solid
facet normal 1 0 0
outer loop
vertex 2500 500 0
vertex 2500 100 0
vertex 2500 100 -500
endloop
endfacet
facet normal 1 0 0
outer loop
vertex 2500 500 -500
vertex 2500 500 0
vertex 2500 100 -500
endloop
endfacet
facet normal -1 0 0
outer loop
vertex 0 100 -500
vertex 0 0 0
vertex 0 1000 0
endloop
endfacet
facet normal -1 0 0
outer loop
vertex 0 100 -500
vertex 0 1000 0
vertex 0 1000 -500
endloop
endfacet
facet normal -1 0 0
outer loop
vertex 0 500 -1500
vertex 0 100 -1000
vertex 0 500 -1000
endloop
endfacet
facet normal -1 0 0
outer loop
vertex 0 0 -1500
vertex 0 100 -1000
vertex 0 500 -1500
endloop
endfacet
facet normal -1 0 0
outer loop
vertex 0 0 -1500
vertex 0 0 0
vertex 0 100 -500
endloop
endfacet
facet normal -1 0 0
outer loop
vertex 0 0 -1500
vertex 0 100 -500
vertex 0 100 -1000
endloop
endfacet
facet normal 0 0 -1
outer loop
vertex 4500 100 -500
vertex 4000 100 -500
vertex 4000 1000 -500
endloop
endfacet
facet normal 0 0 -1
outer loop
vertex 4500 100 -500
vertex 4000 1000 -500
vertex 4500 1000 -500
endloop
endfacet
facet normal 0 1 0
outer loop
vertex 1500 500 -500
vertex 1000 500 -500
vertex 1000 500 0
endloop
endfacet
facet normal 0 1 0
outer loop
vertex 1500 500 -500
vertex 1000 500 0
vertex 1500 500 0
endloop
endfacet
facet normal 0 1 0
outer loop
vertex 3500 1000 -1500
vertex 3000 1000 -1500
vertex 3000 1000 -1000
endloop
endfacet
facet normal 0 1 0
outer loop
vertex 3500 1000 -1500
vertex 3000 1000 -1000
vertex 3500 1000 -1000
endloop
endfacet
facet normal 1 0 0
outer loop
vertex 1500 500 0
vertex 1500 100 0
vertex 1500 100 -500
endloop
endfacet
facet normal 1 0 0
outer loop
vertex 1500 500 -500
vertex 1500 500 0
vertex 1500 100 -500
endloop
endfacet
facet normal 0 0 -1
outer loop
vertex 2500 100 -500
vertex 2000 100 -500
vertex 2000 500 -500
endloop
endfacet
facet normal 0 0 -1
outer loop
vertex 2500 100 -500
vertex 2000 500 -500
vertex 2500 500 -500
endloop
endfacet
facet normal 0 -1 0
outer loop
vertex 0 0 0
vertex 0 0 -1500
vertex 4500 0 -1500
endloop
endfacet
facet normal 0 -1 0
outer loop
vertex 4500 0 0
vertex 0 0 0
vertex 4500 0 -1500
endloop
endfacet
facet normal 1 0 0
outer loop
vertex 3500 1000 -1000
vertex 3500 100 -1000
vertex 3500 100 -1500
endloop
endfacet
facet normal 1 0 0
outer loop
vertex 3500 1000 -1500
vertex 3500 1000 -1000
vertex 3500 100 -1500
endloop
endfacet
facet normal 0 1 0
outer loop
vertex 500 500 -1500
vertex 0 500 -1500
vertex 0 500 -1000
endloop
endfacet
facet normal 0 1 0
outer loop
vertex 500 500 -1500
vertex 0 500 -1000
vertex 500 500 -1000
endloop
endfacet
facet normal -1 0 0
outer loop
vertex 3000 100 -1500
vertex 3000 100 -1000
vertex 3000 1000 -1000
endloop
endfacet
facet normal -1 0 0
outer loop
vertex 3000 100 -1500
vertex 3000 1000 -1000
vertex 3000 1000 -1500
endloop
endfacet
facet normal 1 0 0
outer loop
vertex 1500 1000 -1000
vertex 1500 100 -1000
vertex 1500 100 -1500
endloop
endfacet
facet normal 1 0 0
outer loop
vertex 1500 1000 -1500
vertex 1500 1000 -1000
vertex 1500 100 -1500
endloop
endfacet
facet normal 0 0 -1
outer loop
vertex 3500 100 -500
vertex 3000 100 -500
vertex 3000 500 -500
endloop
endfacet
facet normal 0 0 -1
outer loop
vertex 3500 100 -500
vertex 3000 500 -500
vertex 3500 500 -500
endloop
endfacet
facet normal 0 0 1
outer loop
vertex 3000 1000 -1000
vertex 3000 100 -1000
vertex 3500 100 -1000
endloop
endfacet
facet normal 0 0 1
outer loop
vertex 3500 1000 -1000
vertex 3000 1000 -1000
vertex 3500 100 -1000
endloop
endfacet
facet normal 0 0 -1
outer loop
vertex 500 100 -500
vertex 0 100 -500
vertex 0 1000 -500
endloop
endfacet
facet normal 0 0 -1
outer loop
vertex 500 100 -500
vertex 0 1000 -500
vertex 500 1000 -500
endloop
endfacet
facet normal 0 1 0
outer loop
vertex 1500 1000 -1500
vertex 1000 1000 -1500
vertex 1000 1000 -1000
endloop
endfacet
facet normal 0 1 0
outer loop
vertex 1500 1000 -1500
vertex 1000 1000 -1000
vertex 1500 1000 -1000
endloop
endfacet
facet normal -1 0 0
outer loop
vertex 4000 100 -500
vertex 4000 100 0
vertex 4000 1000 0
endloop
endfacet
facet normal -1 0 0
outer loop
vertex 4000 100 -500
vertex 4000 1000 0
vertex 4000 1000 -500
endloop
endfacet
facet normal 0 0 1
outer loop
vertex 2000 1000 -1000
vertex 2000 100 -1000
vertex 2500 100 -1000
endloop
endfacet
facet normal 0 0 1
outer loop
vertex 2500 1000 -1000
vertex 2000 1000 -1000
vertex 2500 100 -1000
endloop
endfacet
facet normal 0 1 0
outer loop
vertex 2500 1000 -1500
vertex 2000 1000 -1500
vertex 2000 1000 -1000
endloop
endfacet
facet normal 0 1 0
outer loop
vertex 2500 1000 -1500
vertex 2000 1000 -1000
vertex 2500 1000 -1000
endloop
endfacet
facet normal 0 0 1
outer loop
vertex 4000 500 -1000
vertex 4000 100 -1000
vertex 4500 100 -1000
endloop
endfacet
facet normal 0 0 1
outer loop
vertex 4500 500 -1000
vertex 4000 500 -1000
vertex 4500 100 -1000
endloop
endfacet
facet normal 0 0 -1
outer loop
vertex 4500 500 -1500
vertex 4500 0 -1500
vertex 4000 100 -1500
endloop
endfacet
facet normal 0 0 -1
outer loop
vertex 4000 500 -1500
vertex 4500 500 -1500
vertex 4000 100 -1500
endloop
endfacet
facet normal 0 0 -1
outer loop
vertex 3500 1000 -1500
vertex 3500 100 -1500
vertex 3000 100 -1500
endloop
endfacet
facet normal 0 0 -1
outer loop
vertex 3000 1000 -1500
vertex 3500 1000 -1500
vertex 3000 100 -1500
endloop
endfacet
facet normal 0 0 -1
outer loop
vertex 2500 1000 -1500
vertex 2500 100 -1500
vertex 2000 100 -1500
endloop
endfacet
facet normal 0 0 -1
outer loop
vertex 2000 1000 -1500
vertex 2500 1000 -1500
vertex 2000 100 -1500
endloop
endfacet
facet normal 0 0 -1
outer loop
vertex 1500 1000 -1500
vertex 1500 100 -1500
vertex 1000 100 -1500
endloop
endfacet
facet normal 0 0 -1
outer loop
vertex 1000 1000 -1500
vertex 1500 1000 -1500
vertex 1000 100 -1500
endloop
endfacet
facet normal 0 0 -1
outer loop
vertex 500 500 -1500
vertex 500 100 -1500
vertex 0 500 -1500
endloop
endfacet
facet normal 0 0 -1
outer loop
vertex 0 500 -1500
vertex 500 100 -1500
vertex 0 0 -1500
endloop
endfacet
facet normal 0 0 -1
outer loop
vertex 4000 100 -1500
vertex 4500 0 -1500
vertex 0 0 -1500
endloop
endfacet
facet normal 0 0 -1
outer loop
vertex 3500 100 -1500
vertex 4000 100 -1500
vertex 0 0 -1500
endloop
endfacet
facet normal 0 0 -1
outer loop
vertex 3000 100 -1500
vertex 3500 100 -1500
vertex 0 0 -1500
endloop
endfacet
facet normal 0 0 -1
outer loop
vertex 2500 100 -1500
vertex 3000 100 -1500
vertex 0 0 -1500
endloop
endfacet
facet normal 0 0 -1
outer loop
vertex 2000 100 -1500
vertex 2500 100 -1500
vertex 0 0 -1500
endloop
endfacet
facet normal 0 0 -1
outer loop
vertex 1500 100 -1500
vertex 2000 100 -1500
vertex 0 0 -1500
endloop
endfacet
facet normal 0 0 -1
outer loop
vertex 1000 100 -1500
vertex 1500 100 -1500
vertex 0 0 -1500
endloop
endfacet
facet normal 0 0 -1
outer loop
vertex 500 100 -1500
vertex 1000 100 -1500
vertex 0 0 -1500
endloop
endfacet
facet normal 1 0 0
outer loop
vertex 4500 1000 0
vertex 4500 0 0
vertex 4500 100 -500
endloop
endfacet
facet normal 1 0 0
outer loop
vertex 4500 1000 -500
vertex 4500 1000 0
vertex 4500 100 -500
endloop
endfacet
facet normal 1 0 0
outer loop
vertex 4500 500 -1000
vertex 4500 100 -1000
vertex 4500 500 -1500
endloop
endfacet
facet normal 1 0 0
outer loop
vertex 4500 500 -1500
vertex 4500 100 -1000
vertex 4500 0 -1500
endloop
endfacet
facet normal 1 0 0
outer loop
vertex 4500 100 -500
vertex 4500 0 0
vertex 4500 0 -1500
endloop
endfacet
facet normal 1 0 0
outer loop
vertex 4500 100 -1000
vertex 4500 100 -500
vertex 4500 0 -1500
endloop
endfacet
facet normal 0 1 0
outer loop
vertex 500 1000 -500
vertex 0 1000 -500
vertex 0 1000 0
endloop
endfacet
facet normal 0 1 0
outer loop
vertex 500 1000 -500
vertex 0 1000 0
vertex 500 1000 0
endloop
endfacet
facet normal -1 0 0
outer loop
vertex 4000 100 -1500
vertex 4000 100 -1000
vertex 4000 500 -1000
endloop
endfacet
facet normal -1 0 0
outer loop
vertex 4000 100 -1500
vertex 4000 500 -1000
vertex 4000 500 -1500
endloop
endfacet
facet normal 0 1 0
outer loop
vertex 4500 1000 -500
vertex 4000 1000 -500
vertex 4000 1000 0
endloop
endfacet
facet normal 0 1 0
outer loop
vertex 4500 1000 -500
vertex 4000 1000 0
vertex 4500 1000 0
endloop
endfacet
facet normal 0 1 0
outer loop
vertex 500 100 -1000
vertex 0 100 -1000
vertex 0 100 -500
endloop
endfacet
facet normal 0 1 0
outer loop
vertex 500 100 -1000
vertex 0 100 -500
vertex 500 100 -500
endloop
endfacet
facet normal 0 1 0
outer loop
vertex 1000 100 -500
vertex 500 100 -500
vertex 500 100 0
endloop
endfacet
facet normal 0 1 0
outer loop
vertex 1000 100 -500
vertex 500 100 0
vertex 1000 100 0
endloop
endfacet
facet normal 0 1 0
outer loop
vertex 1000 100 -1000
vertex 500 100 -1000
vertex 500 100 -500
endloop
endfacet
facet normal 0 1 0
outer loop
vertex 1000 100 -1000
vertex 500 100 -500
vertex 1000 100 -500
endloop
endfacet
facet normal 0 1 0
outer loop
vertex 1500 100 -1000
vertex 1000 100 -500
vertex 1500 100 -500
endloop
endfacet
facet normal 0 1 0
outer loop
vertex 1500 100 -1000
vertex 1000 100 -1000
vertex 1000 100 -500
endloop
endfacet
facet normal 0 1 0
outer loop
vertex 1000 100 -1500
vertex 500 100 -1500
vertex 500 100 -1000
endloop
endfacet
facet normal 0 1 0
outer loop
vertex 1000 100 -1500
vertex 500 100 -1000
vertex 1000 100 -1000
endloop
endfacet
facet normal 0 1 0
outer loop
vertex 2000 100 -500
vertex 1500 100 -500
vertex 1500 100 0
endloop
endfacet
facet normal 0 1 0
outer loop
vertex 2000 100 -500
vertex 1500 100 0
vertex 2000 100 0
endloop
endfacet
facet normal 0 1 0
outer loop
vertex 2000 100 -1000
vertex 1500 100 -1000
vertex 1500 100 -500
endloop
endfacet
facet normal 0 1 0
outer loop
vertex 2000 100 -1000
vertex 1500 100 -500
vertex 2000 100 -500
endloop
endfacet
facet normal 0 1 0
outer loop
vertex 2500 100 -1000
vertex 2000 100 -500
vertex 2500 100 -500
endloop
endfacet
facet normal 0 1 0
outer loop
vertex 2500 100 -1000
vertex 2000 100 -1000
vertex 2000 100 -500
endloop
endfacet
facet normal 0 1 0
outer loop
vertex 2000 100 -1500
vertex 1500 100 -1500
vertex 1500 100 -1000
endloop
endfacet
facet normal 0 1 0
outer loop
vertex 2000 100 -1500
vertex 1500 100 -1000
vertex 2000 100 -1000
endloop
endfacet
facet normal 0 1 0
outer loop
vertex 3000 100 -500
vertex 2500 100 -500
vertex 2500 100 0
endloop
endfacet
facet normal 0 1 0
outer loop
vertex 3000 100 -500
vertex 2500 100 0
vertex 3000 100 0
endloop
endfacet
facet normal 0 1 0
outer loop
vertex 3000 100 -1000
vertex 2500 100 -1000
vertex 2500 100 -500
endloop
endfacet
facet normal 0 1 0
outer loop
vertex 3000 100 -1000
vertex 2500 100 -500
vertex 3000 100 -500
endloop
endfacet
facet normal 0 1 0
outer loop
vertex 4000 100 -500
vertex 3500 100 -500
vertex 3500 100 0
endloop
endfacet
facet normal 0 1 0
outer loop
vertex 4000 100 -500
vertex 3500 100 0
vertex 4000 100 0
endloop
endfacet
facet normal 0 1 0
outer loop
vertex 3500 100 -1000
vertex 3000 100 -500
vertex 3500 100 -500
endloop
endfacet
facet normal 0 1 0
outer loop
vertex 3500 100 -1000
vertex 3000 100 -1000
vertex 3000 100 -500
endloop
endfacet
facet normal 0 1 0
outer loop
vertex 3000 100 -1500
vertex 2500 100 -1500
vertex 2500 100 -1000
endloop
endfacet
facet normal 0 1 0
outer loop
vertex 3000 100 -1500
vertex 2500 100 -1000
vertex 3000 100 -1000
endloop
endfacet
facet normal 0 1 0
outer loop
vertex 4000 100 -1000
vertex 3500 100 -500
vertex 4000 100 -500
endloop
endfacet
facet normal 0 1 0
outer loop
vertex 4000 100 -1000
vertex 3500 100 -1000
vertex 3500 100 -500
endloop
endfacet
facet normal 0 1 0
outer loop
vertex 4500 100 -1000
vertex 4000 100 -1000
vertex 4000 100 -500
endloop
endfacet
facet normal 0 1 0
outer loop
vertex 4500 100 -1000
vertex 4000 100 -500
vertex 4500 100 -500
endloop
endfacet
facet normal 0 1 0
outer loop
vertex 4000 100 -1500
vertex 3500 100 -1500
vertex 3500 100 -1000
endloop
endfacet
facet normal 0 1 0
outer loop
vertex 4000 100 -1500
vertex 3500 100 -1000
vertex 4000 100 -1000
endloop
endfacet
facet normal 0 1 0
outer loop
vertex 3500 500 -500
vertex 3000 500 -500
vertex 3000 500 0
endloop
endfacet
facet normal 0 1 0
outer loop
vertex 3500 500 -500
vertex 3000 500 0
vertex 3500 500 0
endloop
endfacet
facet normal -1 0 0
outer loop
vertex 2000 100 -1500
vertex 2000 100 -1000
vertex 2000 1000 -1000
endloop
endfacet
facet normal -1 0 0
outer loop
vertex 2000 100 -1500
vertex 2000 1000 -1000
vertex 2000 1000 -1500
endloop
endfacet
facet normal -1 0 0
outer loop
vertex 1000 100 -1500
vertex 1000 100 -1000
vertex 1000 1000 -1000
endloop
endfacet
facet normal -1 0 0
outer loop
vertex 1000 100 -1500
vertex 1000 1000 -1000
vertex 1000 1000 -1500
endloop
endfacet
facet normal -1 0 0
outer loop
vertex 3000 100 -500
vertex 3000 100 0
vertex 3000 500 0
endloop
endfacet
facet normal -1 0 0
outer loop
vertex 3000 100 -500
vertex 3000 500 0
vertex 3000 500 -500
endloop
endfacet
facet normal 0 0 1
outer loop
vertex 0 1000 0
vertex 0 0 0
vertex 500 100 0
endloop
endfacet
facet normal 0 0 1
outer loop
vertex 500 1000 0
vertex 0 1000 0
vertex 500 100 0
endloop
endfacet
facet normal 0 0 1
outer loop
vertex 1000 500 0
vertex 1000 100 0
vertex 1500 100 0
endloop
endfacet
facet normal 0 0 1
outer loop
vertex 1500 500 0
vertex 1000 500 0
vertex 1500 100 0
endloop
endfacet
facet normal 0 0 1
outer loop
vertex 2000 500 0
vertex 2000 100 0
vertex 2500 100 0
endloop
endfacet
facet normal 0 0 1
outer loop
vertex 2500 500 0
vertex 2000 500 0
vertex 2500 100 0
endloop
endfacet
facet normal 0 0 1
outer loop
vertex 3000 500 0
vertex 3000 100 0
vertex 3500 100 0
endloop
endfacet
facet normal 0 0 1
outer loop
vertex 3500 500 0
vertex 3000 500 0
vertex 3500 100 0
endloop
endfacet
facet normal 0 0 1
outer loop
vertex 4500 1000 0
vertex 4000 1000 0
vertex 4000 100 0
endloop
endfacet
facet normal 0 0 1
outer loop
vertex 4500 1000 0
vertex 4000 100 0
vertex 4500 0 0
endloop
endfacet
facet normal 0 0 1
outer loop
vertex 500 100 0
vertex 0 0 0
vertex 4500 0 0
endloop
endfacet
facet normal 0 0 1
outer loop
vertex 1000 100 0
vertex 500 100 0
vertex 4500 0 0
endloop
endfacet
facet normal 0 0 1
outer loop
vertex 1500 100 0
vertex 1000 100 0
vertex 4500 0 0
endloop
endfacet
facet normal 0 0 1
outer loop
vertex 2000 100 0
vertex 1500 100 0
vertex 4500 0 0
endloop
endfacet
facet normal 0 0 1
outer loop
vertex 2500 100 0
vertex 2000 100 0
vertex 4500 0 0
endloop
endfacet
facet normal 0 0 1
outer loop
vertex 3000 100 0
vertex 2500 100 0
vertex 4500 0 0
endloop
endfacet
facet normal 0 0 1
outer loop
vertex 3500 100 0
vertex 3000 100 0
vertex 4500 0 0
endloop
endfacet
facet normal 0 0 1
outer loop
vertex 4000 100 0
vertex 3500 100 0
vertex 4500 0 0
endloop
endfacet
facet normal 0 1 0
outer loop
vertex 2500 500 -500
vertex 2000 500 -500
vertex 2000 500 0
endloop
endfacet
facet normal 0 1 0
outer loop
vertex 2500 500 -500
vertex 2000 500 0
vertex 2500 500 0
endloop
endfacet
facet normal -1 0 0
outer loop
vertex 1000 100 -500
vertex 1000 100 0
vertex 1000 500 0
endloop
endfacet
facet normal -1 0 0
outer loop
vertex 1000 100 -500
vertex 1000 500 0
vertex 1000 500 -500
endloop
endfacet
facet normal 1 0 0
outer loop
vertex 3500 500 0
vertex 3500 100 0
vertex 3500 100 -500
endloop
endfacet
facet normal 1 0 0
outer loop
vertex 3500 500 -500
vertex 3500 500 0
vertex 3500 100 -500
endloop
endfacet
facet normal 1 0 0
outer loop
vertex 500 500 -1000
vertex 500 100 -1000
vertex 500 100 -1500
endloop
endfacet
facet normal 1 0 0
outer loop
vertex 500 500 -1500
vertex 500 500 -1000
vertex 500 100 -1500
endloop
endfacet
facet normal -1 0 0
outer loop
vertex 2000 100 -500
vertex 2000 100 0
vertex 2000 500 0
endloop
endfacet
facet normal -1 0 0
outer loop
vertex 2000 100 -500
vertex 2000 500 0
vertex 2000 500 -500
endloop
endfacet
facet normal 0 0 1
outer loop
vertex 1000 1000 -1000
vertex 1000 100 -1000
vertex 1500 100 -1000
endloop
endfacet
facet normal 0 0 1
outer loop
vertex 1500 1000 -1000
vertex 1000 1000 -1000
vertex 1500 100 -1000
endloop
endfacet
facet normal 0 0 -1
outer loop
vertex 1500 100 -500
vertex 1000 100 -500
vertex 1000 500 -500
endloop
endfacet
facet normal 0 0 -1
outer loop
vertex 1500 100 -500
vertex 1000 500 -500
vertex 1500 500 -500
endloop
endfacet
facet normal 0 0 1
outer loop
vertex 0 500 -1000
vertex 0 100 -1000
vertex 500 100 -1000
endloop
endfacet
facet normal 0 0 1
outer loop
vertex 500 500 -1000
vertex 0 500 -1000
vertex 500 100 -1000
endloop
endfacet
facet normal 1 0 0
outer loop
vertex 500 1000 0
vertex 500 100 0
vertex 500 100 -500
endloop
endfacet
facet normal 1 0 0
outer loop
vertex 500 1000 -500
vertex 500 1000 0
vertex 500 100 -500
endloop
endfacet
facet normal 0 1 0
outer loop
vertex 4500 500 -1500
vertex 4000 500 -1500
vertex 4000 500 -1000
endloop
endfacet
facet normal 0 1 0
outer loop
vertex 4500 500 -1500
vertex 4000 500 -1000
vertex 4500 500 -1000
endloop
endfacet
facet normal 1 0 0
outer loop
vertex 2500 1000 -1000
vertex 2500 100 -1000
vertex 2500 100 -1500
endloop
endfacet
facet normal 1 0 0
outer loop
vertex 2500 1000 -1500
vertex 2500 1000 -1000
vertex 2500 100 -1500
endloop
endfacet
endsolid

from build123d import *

# Parameters (mm, degrees)
SKETCH2_W             = 500
SKETCH2_H             = 500
BOSS_EXTRUDE1_DEPTH   = 500
BOSS_EXTRUDE1_2_DEPTH = 500
BOSS_EXTRUDE1_3_DEPTH = 500
BOSS_EXTRUDE1_4_DEPTH = 500
BOSS_EXTRUDE1_5_DEPTH = 500
SKETCH2_3_W           = 500
SKETCH2_3_H           = 500
BOSS_EXTRUDE2_DEPTH   = 1000
BOSS_EXTRUDE2_2_DEPTH = 1000
BOSS_EXTRUDE2_3_DEPTH = 1000
BOSS_EXTRUDE2_4_DEPTH = 1000
BOSS_EXTRUDE2_5_DEPTH = 1000
BOSS_EXTRUDE3_DEPTH   = 100


with BuildPart() as part:
    # Sketch2 → Boss-Extrude1 (new body)
    with BuildSketch(Plane(origin=(0, 0, 0), x_dir=(1, 0, 0), z_dir=(0, 1, 0))):
        with Locations((1250, 250)):
            Rectangle(SKETCH2_W, SKETCH2_H)
    extrude(amount=BOSS_EXTRUDE1_DEPTH)



with BuildPart() as body_2:
    # Sketch2 → Boss-Extrude1 2 (new body)
    with BuildSketch(Plane(origin=(0, 0, 0), x_dir=(1, 0, 0), z_dir=(0, 1, 0))):
        with Locations((2250, 250)):
            Rectangle(SKETCH2_W, SKETCH2_H)
    extrude(amount=BOSS_EXTRUDE1_2_DEPTH)


with BuildPart() as body_3:
    # Sketch2 → Boss-Extrude1 3 (new body)
    with BuildSketch(Plane(origin=(0, 0, 0), x_dir=(1, 0, 0), z_dir=(0, 1, 0))):
        with Locations((4250, 1250)):
            Rectangle(SKETCH2_W, SKETCH2_H)
    extrude(amount=BOSS_EXTRUDE1_3_DEPTH)


with BuildPart() as body_4:
    # Sketch2 → Boss-Extrude1 4 (new body)
    with BuildSketch(Plane(origin=(0, 0, 0), x_dir=(1, 0, 0), z_dir=(0, 1, 0))):
        with Locations((250, 1250)):
            Rectangle(SKETCH2_W, SKETCH2_H)
    extrude(amount=BOSS_EXTRUDE1_4_DEPTH)


with BuildPart() as body_5:
    # Sketch2 → Boss-Extrude1 5 (new body)
    with BuildSketch(Plane(origin=(0, 0, 0), x_dir=(1, 0, 0), z_dir=(0, 1, 0))):
        with Locations((3250, 250)):
            Rectangle(SKETCH2_W, SKETCH2_H)
    extrude(amount=BOSS_EXTRUDE1_5_DEPTH)


with BuildPart() as body_6:
    # Sketch2<3> → Boss-Extrude2 (new body)
    with BuildSketch(Plane(origin=(0, 0, 0), x_dir=(1, 0, 0), z_dir=(0, 1, 0))):
        with Locations((250, 250)):
            Rectangle(SKETCH2_3_W, SKETCH2_3_H)
    extrude(amount=BOSS_EXTRUDE2_DEPTH)


with BuildPart() as body_7:
    # Sketch2<3> → Boss-Extrude2 2 (new body)
    with BuildSketch(Plane(origin=(0, 0, 0), x_dir=(1, 0, 0), z_dir=(0, 1, 0))):
        with Locations((1250, 1250)):
            Rectangle(SKETCH2_3_W, SKETCH2_3_H)
    extrude(amount=BOSS_EXTRUDE2_2_DEPTH)


with BuildPart() as body_8:
    # Sketch2<3> → Boss-Extrude2 3 (new body)
    with BuildSketch(Plane(origin=(0, 0, 0), x_dir=(1, 0, 0), z_dir=(0, 1, 0))):
        with Locations((2250, 1250)):
            Rectangle(SKETCH2_3_W, SKETCH2_3_H)
    extrude(amount=BOSS_EXTRUDE2_3_DEPTH)


with BuildPart() as body_9:
    # Sketch2<3> → Boss-Extrude2 4 (new body)
    with BuildSketch(Plane(origin=(0, 0, 0), x_dir=(1, 0, 0), z_dir=(0, 1, 0))):
        with Locations((3250, 1250)):
            Rectangle(SKETCH2_3_W, SKETCH2_3_H)
    extrude(amount=BOSS_EXTRUDE2_4_DEPTH)


with BuildPart() as body_10:
    # Sketch2<3> → Boss-Extrude2 5 (new body)
    with BuildSketch(Plane(origin=(0, 0, 0), x_dir=(1, 0, 0), z_dir=(0, 1, 0))):
        with Locations((4250, 250)):
            Rectangle(SKETCH2_3_W, SKETCH2_3_H)
    extrude(amount=BOSS_EXTRUDE2_5_DEPTH)


with BuildPart() as part_1:
    add(part.part)

    add(body_2.part)  # Boss-Extrude3 merges body 2

    add(body_3.part)  # Boss-Extrude3 merges body 3

    add(body_4.part)  # Boss-Extrude3 merges body 4

    add(body_5.part)  # Boss-Extrude3 merges body 5

    add(body_6.part)  # Boss-Extrude3 merges body 6

    add(body_7.part)  # Boss-Extrude3 merges body 7

    add(body_8.part)  # Boss-Extrude3 merges body 8

    add(body_9.part)  # Boss-Extrude3 merges body 9

    add(body_10.part)  # Boss-Extrude3 merges body 10
    # Sketch2<4> → Boss-Extrude3 (add)
    with BuildSketch(Plane(origin=(0, 0, 0), x_dir=(1, 0, 0), z_dir=(0, 1, 0))):
        Polygon((1000, 1000), (1000, 1500), (500, 1500), (500, 1000), (0, 1000), (0, 500), (500, 500), (500, 0), (1000, 0), (1000, 500), (1500, 500), (1500, 0), (2000, 0), (2000, 500), (2500, 500), (2500, 0), (3000, 0), (3000, 500), (3500, 500), (3500, 0), (4000, 0), (4000, 500), (4500, 500), (4500, 1000), (4000, 1000), (4000, 1500), (3500, 1500), (3500, 1000), (3000, 1000), (3000, 1500), (2500, 1500), (2500, 1000), (2000, 1000), (2000, 1500), (1500, 1500), (1500, 1000), align=None)
    extrude(amount=BOSS_EXTRUDE3_DEPTH)


solid = part_1.part
